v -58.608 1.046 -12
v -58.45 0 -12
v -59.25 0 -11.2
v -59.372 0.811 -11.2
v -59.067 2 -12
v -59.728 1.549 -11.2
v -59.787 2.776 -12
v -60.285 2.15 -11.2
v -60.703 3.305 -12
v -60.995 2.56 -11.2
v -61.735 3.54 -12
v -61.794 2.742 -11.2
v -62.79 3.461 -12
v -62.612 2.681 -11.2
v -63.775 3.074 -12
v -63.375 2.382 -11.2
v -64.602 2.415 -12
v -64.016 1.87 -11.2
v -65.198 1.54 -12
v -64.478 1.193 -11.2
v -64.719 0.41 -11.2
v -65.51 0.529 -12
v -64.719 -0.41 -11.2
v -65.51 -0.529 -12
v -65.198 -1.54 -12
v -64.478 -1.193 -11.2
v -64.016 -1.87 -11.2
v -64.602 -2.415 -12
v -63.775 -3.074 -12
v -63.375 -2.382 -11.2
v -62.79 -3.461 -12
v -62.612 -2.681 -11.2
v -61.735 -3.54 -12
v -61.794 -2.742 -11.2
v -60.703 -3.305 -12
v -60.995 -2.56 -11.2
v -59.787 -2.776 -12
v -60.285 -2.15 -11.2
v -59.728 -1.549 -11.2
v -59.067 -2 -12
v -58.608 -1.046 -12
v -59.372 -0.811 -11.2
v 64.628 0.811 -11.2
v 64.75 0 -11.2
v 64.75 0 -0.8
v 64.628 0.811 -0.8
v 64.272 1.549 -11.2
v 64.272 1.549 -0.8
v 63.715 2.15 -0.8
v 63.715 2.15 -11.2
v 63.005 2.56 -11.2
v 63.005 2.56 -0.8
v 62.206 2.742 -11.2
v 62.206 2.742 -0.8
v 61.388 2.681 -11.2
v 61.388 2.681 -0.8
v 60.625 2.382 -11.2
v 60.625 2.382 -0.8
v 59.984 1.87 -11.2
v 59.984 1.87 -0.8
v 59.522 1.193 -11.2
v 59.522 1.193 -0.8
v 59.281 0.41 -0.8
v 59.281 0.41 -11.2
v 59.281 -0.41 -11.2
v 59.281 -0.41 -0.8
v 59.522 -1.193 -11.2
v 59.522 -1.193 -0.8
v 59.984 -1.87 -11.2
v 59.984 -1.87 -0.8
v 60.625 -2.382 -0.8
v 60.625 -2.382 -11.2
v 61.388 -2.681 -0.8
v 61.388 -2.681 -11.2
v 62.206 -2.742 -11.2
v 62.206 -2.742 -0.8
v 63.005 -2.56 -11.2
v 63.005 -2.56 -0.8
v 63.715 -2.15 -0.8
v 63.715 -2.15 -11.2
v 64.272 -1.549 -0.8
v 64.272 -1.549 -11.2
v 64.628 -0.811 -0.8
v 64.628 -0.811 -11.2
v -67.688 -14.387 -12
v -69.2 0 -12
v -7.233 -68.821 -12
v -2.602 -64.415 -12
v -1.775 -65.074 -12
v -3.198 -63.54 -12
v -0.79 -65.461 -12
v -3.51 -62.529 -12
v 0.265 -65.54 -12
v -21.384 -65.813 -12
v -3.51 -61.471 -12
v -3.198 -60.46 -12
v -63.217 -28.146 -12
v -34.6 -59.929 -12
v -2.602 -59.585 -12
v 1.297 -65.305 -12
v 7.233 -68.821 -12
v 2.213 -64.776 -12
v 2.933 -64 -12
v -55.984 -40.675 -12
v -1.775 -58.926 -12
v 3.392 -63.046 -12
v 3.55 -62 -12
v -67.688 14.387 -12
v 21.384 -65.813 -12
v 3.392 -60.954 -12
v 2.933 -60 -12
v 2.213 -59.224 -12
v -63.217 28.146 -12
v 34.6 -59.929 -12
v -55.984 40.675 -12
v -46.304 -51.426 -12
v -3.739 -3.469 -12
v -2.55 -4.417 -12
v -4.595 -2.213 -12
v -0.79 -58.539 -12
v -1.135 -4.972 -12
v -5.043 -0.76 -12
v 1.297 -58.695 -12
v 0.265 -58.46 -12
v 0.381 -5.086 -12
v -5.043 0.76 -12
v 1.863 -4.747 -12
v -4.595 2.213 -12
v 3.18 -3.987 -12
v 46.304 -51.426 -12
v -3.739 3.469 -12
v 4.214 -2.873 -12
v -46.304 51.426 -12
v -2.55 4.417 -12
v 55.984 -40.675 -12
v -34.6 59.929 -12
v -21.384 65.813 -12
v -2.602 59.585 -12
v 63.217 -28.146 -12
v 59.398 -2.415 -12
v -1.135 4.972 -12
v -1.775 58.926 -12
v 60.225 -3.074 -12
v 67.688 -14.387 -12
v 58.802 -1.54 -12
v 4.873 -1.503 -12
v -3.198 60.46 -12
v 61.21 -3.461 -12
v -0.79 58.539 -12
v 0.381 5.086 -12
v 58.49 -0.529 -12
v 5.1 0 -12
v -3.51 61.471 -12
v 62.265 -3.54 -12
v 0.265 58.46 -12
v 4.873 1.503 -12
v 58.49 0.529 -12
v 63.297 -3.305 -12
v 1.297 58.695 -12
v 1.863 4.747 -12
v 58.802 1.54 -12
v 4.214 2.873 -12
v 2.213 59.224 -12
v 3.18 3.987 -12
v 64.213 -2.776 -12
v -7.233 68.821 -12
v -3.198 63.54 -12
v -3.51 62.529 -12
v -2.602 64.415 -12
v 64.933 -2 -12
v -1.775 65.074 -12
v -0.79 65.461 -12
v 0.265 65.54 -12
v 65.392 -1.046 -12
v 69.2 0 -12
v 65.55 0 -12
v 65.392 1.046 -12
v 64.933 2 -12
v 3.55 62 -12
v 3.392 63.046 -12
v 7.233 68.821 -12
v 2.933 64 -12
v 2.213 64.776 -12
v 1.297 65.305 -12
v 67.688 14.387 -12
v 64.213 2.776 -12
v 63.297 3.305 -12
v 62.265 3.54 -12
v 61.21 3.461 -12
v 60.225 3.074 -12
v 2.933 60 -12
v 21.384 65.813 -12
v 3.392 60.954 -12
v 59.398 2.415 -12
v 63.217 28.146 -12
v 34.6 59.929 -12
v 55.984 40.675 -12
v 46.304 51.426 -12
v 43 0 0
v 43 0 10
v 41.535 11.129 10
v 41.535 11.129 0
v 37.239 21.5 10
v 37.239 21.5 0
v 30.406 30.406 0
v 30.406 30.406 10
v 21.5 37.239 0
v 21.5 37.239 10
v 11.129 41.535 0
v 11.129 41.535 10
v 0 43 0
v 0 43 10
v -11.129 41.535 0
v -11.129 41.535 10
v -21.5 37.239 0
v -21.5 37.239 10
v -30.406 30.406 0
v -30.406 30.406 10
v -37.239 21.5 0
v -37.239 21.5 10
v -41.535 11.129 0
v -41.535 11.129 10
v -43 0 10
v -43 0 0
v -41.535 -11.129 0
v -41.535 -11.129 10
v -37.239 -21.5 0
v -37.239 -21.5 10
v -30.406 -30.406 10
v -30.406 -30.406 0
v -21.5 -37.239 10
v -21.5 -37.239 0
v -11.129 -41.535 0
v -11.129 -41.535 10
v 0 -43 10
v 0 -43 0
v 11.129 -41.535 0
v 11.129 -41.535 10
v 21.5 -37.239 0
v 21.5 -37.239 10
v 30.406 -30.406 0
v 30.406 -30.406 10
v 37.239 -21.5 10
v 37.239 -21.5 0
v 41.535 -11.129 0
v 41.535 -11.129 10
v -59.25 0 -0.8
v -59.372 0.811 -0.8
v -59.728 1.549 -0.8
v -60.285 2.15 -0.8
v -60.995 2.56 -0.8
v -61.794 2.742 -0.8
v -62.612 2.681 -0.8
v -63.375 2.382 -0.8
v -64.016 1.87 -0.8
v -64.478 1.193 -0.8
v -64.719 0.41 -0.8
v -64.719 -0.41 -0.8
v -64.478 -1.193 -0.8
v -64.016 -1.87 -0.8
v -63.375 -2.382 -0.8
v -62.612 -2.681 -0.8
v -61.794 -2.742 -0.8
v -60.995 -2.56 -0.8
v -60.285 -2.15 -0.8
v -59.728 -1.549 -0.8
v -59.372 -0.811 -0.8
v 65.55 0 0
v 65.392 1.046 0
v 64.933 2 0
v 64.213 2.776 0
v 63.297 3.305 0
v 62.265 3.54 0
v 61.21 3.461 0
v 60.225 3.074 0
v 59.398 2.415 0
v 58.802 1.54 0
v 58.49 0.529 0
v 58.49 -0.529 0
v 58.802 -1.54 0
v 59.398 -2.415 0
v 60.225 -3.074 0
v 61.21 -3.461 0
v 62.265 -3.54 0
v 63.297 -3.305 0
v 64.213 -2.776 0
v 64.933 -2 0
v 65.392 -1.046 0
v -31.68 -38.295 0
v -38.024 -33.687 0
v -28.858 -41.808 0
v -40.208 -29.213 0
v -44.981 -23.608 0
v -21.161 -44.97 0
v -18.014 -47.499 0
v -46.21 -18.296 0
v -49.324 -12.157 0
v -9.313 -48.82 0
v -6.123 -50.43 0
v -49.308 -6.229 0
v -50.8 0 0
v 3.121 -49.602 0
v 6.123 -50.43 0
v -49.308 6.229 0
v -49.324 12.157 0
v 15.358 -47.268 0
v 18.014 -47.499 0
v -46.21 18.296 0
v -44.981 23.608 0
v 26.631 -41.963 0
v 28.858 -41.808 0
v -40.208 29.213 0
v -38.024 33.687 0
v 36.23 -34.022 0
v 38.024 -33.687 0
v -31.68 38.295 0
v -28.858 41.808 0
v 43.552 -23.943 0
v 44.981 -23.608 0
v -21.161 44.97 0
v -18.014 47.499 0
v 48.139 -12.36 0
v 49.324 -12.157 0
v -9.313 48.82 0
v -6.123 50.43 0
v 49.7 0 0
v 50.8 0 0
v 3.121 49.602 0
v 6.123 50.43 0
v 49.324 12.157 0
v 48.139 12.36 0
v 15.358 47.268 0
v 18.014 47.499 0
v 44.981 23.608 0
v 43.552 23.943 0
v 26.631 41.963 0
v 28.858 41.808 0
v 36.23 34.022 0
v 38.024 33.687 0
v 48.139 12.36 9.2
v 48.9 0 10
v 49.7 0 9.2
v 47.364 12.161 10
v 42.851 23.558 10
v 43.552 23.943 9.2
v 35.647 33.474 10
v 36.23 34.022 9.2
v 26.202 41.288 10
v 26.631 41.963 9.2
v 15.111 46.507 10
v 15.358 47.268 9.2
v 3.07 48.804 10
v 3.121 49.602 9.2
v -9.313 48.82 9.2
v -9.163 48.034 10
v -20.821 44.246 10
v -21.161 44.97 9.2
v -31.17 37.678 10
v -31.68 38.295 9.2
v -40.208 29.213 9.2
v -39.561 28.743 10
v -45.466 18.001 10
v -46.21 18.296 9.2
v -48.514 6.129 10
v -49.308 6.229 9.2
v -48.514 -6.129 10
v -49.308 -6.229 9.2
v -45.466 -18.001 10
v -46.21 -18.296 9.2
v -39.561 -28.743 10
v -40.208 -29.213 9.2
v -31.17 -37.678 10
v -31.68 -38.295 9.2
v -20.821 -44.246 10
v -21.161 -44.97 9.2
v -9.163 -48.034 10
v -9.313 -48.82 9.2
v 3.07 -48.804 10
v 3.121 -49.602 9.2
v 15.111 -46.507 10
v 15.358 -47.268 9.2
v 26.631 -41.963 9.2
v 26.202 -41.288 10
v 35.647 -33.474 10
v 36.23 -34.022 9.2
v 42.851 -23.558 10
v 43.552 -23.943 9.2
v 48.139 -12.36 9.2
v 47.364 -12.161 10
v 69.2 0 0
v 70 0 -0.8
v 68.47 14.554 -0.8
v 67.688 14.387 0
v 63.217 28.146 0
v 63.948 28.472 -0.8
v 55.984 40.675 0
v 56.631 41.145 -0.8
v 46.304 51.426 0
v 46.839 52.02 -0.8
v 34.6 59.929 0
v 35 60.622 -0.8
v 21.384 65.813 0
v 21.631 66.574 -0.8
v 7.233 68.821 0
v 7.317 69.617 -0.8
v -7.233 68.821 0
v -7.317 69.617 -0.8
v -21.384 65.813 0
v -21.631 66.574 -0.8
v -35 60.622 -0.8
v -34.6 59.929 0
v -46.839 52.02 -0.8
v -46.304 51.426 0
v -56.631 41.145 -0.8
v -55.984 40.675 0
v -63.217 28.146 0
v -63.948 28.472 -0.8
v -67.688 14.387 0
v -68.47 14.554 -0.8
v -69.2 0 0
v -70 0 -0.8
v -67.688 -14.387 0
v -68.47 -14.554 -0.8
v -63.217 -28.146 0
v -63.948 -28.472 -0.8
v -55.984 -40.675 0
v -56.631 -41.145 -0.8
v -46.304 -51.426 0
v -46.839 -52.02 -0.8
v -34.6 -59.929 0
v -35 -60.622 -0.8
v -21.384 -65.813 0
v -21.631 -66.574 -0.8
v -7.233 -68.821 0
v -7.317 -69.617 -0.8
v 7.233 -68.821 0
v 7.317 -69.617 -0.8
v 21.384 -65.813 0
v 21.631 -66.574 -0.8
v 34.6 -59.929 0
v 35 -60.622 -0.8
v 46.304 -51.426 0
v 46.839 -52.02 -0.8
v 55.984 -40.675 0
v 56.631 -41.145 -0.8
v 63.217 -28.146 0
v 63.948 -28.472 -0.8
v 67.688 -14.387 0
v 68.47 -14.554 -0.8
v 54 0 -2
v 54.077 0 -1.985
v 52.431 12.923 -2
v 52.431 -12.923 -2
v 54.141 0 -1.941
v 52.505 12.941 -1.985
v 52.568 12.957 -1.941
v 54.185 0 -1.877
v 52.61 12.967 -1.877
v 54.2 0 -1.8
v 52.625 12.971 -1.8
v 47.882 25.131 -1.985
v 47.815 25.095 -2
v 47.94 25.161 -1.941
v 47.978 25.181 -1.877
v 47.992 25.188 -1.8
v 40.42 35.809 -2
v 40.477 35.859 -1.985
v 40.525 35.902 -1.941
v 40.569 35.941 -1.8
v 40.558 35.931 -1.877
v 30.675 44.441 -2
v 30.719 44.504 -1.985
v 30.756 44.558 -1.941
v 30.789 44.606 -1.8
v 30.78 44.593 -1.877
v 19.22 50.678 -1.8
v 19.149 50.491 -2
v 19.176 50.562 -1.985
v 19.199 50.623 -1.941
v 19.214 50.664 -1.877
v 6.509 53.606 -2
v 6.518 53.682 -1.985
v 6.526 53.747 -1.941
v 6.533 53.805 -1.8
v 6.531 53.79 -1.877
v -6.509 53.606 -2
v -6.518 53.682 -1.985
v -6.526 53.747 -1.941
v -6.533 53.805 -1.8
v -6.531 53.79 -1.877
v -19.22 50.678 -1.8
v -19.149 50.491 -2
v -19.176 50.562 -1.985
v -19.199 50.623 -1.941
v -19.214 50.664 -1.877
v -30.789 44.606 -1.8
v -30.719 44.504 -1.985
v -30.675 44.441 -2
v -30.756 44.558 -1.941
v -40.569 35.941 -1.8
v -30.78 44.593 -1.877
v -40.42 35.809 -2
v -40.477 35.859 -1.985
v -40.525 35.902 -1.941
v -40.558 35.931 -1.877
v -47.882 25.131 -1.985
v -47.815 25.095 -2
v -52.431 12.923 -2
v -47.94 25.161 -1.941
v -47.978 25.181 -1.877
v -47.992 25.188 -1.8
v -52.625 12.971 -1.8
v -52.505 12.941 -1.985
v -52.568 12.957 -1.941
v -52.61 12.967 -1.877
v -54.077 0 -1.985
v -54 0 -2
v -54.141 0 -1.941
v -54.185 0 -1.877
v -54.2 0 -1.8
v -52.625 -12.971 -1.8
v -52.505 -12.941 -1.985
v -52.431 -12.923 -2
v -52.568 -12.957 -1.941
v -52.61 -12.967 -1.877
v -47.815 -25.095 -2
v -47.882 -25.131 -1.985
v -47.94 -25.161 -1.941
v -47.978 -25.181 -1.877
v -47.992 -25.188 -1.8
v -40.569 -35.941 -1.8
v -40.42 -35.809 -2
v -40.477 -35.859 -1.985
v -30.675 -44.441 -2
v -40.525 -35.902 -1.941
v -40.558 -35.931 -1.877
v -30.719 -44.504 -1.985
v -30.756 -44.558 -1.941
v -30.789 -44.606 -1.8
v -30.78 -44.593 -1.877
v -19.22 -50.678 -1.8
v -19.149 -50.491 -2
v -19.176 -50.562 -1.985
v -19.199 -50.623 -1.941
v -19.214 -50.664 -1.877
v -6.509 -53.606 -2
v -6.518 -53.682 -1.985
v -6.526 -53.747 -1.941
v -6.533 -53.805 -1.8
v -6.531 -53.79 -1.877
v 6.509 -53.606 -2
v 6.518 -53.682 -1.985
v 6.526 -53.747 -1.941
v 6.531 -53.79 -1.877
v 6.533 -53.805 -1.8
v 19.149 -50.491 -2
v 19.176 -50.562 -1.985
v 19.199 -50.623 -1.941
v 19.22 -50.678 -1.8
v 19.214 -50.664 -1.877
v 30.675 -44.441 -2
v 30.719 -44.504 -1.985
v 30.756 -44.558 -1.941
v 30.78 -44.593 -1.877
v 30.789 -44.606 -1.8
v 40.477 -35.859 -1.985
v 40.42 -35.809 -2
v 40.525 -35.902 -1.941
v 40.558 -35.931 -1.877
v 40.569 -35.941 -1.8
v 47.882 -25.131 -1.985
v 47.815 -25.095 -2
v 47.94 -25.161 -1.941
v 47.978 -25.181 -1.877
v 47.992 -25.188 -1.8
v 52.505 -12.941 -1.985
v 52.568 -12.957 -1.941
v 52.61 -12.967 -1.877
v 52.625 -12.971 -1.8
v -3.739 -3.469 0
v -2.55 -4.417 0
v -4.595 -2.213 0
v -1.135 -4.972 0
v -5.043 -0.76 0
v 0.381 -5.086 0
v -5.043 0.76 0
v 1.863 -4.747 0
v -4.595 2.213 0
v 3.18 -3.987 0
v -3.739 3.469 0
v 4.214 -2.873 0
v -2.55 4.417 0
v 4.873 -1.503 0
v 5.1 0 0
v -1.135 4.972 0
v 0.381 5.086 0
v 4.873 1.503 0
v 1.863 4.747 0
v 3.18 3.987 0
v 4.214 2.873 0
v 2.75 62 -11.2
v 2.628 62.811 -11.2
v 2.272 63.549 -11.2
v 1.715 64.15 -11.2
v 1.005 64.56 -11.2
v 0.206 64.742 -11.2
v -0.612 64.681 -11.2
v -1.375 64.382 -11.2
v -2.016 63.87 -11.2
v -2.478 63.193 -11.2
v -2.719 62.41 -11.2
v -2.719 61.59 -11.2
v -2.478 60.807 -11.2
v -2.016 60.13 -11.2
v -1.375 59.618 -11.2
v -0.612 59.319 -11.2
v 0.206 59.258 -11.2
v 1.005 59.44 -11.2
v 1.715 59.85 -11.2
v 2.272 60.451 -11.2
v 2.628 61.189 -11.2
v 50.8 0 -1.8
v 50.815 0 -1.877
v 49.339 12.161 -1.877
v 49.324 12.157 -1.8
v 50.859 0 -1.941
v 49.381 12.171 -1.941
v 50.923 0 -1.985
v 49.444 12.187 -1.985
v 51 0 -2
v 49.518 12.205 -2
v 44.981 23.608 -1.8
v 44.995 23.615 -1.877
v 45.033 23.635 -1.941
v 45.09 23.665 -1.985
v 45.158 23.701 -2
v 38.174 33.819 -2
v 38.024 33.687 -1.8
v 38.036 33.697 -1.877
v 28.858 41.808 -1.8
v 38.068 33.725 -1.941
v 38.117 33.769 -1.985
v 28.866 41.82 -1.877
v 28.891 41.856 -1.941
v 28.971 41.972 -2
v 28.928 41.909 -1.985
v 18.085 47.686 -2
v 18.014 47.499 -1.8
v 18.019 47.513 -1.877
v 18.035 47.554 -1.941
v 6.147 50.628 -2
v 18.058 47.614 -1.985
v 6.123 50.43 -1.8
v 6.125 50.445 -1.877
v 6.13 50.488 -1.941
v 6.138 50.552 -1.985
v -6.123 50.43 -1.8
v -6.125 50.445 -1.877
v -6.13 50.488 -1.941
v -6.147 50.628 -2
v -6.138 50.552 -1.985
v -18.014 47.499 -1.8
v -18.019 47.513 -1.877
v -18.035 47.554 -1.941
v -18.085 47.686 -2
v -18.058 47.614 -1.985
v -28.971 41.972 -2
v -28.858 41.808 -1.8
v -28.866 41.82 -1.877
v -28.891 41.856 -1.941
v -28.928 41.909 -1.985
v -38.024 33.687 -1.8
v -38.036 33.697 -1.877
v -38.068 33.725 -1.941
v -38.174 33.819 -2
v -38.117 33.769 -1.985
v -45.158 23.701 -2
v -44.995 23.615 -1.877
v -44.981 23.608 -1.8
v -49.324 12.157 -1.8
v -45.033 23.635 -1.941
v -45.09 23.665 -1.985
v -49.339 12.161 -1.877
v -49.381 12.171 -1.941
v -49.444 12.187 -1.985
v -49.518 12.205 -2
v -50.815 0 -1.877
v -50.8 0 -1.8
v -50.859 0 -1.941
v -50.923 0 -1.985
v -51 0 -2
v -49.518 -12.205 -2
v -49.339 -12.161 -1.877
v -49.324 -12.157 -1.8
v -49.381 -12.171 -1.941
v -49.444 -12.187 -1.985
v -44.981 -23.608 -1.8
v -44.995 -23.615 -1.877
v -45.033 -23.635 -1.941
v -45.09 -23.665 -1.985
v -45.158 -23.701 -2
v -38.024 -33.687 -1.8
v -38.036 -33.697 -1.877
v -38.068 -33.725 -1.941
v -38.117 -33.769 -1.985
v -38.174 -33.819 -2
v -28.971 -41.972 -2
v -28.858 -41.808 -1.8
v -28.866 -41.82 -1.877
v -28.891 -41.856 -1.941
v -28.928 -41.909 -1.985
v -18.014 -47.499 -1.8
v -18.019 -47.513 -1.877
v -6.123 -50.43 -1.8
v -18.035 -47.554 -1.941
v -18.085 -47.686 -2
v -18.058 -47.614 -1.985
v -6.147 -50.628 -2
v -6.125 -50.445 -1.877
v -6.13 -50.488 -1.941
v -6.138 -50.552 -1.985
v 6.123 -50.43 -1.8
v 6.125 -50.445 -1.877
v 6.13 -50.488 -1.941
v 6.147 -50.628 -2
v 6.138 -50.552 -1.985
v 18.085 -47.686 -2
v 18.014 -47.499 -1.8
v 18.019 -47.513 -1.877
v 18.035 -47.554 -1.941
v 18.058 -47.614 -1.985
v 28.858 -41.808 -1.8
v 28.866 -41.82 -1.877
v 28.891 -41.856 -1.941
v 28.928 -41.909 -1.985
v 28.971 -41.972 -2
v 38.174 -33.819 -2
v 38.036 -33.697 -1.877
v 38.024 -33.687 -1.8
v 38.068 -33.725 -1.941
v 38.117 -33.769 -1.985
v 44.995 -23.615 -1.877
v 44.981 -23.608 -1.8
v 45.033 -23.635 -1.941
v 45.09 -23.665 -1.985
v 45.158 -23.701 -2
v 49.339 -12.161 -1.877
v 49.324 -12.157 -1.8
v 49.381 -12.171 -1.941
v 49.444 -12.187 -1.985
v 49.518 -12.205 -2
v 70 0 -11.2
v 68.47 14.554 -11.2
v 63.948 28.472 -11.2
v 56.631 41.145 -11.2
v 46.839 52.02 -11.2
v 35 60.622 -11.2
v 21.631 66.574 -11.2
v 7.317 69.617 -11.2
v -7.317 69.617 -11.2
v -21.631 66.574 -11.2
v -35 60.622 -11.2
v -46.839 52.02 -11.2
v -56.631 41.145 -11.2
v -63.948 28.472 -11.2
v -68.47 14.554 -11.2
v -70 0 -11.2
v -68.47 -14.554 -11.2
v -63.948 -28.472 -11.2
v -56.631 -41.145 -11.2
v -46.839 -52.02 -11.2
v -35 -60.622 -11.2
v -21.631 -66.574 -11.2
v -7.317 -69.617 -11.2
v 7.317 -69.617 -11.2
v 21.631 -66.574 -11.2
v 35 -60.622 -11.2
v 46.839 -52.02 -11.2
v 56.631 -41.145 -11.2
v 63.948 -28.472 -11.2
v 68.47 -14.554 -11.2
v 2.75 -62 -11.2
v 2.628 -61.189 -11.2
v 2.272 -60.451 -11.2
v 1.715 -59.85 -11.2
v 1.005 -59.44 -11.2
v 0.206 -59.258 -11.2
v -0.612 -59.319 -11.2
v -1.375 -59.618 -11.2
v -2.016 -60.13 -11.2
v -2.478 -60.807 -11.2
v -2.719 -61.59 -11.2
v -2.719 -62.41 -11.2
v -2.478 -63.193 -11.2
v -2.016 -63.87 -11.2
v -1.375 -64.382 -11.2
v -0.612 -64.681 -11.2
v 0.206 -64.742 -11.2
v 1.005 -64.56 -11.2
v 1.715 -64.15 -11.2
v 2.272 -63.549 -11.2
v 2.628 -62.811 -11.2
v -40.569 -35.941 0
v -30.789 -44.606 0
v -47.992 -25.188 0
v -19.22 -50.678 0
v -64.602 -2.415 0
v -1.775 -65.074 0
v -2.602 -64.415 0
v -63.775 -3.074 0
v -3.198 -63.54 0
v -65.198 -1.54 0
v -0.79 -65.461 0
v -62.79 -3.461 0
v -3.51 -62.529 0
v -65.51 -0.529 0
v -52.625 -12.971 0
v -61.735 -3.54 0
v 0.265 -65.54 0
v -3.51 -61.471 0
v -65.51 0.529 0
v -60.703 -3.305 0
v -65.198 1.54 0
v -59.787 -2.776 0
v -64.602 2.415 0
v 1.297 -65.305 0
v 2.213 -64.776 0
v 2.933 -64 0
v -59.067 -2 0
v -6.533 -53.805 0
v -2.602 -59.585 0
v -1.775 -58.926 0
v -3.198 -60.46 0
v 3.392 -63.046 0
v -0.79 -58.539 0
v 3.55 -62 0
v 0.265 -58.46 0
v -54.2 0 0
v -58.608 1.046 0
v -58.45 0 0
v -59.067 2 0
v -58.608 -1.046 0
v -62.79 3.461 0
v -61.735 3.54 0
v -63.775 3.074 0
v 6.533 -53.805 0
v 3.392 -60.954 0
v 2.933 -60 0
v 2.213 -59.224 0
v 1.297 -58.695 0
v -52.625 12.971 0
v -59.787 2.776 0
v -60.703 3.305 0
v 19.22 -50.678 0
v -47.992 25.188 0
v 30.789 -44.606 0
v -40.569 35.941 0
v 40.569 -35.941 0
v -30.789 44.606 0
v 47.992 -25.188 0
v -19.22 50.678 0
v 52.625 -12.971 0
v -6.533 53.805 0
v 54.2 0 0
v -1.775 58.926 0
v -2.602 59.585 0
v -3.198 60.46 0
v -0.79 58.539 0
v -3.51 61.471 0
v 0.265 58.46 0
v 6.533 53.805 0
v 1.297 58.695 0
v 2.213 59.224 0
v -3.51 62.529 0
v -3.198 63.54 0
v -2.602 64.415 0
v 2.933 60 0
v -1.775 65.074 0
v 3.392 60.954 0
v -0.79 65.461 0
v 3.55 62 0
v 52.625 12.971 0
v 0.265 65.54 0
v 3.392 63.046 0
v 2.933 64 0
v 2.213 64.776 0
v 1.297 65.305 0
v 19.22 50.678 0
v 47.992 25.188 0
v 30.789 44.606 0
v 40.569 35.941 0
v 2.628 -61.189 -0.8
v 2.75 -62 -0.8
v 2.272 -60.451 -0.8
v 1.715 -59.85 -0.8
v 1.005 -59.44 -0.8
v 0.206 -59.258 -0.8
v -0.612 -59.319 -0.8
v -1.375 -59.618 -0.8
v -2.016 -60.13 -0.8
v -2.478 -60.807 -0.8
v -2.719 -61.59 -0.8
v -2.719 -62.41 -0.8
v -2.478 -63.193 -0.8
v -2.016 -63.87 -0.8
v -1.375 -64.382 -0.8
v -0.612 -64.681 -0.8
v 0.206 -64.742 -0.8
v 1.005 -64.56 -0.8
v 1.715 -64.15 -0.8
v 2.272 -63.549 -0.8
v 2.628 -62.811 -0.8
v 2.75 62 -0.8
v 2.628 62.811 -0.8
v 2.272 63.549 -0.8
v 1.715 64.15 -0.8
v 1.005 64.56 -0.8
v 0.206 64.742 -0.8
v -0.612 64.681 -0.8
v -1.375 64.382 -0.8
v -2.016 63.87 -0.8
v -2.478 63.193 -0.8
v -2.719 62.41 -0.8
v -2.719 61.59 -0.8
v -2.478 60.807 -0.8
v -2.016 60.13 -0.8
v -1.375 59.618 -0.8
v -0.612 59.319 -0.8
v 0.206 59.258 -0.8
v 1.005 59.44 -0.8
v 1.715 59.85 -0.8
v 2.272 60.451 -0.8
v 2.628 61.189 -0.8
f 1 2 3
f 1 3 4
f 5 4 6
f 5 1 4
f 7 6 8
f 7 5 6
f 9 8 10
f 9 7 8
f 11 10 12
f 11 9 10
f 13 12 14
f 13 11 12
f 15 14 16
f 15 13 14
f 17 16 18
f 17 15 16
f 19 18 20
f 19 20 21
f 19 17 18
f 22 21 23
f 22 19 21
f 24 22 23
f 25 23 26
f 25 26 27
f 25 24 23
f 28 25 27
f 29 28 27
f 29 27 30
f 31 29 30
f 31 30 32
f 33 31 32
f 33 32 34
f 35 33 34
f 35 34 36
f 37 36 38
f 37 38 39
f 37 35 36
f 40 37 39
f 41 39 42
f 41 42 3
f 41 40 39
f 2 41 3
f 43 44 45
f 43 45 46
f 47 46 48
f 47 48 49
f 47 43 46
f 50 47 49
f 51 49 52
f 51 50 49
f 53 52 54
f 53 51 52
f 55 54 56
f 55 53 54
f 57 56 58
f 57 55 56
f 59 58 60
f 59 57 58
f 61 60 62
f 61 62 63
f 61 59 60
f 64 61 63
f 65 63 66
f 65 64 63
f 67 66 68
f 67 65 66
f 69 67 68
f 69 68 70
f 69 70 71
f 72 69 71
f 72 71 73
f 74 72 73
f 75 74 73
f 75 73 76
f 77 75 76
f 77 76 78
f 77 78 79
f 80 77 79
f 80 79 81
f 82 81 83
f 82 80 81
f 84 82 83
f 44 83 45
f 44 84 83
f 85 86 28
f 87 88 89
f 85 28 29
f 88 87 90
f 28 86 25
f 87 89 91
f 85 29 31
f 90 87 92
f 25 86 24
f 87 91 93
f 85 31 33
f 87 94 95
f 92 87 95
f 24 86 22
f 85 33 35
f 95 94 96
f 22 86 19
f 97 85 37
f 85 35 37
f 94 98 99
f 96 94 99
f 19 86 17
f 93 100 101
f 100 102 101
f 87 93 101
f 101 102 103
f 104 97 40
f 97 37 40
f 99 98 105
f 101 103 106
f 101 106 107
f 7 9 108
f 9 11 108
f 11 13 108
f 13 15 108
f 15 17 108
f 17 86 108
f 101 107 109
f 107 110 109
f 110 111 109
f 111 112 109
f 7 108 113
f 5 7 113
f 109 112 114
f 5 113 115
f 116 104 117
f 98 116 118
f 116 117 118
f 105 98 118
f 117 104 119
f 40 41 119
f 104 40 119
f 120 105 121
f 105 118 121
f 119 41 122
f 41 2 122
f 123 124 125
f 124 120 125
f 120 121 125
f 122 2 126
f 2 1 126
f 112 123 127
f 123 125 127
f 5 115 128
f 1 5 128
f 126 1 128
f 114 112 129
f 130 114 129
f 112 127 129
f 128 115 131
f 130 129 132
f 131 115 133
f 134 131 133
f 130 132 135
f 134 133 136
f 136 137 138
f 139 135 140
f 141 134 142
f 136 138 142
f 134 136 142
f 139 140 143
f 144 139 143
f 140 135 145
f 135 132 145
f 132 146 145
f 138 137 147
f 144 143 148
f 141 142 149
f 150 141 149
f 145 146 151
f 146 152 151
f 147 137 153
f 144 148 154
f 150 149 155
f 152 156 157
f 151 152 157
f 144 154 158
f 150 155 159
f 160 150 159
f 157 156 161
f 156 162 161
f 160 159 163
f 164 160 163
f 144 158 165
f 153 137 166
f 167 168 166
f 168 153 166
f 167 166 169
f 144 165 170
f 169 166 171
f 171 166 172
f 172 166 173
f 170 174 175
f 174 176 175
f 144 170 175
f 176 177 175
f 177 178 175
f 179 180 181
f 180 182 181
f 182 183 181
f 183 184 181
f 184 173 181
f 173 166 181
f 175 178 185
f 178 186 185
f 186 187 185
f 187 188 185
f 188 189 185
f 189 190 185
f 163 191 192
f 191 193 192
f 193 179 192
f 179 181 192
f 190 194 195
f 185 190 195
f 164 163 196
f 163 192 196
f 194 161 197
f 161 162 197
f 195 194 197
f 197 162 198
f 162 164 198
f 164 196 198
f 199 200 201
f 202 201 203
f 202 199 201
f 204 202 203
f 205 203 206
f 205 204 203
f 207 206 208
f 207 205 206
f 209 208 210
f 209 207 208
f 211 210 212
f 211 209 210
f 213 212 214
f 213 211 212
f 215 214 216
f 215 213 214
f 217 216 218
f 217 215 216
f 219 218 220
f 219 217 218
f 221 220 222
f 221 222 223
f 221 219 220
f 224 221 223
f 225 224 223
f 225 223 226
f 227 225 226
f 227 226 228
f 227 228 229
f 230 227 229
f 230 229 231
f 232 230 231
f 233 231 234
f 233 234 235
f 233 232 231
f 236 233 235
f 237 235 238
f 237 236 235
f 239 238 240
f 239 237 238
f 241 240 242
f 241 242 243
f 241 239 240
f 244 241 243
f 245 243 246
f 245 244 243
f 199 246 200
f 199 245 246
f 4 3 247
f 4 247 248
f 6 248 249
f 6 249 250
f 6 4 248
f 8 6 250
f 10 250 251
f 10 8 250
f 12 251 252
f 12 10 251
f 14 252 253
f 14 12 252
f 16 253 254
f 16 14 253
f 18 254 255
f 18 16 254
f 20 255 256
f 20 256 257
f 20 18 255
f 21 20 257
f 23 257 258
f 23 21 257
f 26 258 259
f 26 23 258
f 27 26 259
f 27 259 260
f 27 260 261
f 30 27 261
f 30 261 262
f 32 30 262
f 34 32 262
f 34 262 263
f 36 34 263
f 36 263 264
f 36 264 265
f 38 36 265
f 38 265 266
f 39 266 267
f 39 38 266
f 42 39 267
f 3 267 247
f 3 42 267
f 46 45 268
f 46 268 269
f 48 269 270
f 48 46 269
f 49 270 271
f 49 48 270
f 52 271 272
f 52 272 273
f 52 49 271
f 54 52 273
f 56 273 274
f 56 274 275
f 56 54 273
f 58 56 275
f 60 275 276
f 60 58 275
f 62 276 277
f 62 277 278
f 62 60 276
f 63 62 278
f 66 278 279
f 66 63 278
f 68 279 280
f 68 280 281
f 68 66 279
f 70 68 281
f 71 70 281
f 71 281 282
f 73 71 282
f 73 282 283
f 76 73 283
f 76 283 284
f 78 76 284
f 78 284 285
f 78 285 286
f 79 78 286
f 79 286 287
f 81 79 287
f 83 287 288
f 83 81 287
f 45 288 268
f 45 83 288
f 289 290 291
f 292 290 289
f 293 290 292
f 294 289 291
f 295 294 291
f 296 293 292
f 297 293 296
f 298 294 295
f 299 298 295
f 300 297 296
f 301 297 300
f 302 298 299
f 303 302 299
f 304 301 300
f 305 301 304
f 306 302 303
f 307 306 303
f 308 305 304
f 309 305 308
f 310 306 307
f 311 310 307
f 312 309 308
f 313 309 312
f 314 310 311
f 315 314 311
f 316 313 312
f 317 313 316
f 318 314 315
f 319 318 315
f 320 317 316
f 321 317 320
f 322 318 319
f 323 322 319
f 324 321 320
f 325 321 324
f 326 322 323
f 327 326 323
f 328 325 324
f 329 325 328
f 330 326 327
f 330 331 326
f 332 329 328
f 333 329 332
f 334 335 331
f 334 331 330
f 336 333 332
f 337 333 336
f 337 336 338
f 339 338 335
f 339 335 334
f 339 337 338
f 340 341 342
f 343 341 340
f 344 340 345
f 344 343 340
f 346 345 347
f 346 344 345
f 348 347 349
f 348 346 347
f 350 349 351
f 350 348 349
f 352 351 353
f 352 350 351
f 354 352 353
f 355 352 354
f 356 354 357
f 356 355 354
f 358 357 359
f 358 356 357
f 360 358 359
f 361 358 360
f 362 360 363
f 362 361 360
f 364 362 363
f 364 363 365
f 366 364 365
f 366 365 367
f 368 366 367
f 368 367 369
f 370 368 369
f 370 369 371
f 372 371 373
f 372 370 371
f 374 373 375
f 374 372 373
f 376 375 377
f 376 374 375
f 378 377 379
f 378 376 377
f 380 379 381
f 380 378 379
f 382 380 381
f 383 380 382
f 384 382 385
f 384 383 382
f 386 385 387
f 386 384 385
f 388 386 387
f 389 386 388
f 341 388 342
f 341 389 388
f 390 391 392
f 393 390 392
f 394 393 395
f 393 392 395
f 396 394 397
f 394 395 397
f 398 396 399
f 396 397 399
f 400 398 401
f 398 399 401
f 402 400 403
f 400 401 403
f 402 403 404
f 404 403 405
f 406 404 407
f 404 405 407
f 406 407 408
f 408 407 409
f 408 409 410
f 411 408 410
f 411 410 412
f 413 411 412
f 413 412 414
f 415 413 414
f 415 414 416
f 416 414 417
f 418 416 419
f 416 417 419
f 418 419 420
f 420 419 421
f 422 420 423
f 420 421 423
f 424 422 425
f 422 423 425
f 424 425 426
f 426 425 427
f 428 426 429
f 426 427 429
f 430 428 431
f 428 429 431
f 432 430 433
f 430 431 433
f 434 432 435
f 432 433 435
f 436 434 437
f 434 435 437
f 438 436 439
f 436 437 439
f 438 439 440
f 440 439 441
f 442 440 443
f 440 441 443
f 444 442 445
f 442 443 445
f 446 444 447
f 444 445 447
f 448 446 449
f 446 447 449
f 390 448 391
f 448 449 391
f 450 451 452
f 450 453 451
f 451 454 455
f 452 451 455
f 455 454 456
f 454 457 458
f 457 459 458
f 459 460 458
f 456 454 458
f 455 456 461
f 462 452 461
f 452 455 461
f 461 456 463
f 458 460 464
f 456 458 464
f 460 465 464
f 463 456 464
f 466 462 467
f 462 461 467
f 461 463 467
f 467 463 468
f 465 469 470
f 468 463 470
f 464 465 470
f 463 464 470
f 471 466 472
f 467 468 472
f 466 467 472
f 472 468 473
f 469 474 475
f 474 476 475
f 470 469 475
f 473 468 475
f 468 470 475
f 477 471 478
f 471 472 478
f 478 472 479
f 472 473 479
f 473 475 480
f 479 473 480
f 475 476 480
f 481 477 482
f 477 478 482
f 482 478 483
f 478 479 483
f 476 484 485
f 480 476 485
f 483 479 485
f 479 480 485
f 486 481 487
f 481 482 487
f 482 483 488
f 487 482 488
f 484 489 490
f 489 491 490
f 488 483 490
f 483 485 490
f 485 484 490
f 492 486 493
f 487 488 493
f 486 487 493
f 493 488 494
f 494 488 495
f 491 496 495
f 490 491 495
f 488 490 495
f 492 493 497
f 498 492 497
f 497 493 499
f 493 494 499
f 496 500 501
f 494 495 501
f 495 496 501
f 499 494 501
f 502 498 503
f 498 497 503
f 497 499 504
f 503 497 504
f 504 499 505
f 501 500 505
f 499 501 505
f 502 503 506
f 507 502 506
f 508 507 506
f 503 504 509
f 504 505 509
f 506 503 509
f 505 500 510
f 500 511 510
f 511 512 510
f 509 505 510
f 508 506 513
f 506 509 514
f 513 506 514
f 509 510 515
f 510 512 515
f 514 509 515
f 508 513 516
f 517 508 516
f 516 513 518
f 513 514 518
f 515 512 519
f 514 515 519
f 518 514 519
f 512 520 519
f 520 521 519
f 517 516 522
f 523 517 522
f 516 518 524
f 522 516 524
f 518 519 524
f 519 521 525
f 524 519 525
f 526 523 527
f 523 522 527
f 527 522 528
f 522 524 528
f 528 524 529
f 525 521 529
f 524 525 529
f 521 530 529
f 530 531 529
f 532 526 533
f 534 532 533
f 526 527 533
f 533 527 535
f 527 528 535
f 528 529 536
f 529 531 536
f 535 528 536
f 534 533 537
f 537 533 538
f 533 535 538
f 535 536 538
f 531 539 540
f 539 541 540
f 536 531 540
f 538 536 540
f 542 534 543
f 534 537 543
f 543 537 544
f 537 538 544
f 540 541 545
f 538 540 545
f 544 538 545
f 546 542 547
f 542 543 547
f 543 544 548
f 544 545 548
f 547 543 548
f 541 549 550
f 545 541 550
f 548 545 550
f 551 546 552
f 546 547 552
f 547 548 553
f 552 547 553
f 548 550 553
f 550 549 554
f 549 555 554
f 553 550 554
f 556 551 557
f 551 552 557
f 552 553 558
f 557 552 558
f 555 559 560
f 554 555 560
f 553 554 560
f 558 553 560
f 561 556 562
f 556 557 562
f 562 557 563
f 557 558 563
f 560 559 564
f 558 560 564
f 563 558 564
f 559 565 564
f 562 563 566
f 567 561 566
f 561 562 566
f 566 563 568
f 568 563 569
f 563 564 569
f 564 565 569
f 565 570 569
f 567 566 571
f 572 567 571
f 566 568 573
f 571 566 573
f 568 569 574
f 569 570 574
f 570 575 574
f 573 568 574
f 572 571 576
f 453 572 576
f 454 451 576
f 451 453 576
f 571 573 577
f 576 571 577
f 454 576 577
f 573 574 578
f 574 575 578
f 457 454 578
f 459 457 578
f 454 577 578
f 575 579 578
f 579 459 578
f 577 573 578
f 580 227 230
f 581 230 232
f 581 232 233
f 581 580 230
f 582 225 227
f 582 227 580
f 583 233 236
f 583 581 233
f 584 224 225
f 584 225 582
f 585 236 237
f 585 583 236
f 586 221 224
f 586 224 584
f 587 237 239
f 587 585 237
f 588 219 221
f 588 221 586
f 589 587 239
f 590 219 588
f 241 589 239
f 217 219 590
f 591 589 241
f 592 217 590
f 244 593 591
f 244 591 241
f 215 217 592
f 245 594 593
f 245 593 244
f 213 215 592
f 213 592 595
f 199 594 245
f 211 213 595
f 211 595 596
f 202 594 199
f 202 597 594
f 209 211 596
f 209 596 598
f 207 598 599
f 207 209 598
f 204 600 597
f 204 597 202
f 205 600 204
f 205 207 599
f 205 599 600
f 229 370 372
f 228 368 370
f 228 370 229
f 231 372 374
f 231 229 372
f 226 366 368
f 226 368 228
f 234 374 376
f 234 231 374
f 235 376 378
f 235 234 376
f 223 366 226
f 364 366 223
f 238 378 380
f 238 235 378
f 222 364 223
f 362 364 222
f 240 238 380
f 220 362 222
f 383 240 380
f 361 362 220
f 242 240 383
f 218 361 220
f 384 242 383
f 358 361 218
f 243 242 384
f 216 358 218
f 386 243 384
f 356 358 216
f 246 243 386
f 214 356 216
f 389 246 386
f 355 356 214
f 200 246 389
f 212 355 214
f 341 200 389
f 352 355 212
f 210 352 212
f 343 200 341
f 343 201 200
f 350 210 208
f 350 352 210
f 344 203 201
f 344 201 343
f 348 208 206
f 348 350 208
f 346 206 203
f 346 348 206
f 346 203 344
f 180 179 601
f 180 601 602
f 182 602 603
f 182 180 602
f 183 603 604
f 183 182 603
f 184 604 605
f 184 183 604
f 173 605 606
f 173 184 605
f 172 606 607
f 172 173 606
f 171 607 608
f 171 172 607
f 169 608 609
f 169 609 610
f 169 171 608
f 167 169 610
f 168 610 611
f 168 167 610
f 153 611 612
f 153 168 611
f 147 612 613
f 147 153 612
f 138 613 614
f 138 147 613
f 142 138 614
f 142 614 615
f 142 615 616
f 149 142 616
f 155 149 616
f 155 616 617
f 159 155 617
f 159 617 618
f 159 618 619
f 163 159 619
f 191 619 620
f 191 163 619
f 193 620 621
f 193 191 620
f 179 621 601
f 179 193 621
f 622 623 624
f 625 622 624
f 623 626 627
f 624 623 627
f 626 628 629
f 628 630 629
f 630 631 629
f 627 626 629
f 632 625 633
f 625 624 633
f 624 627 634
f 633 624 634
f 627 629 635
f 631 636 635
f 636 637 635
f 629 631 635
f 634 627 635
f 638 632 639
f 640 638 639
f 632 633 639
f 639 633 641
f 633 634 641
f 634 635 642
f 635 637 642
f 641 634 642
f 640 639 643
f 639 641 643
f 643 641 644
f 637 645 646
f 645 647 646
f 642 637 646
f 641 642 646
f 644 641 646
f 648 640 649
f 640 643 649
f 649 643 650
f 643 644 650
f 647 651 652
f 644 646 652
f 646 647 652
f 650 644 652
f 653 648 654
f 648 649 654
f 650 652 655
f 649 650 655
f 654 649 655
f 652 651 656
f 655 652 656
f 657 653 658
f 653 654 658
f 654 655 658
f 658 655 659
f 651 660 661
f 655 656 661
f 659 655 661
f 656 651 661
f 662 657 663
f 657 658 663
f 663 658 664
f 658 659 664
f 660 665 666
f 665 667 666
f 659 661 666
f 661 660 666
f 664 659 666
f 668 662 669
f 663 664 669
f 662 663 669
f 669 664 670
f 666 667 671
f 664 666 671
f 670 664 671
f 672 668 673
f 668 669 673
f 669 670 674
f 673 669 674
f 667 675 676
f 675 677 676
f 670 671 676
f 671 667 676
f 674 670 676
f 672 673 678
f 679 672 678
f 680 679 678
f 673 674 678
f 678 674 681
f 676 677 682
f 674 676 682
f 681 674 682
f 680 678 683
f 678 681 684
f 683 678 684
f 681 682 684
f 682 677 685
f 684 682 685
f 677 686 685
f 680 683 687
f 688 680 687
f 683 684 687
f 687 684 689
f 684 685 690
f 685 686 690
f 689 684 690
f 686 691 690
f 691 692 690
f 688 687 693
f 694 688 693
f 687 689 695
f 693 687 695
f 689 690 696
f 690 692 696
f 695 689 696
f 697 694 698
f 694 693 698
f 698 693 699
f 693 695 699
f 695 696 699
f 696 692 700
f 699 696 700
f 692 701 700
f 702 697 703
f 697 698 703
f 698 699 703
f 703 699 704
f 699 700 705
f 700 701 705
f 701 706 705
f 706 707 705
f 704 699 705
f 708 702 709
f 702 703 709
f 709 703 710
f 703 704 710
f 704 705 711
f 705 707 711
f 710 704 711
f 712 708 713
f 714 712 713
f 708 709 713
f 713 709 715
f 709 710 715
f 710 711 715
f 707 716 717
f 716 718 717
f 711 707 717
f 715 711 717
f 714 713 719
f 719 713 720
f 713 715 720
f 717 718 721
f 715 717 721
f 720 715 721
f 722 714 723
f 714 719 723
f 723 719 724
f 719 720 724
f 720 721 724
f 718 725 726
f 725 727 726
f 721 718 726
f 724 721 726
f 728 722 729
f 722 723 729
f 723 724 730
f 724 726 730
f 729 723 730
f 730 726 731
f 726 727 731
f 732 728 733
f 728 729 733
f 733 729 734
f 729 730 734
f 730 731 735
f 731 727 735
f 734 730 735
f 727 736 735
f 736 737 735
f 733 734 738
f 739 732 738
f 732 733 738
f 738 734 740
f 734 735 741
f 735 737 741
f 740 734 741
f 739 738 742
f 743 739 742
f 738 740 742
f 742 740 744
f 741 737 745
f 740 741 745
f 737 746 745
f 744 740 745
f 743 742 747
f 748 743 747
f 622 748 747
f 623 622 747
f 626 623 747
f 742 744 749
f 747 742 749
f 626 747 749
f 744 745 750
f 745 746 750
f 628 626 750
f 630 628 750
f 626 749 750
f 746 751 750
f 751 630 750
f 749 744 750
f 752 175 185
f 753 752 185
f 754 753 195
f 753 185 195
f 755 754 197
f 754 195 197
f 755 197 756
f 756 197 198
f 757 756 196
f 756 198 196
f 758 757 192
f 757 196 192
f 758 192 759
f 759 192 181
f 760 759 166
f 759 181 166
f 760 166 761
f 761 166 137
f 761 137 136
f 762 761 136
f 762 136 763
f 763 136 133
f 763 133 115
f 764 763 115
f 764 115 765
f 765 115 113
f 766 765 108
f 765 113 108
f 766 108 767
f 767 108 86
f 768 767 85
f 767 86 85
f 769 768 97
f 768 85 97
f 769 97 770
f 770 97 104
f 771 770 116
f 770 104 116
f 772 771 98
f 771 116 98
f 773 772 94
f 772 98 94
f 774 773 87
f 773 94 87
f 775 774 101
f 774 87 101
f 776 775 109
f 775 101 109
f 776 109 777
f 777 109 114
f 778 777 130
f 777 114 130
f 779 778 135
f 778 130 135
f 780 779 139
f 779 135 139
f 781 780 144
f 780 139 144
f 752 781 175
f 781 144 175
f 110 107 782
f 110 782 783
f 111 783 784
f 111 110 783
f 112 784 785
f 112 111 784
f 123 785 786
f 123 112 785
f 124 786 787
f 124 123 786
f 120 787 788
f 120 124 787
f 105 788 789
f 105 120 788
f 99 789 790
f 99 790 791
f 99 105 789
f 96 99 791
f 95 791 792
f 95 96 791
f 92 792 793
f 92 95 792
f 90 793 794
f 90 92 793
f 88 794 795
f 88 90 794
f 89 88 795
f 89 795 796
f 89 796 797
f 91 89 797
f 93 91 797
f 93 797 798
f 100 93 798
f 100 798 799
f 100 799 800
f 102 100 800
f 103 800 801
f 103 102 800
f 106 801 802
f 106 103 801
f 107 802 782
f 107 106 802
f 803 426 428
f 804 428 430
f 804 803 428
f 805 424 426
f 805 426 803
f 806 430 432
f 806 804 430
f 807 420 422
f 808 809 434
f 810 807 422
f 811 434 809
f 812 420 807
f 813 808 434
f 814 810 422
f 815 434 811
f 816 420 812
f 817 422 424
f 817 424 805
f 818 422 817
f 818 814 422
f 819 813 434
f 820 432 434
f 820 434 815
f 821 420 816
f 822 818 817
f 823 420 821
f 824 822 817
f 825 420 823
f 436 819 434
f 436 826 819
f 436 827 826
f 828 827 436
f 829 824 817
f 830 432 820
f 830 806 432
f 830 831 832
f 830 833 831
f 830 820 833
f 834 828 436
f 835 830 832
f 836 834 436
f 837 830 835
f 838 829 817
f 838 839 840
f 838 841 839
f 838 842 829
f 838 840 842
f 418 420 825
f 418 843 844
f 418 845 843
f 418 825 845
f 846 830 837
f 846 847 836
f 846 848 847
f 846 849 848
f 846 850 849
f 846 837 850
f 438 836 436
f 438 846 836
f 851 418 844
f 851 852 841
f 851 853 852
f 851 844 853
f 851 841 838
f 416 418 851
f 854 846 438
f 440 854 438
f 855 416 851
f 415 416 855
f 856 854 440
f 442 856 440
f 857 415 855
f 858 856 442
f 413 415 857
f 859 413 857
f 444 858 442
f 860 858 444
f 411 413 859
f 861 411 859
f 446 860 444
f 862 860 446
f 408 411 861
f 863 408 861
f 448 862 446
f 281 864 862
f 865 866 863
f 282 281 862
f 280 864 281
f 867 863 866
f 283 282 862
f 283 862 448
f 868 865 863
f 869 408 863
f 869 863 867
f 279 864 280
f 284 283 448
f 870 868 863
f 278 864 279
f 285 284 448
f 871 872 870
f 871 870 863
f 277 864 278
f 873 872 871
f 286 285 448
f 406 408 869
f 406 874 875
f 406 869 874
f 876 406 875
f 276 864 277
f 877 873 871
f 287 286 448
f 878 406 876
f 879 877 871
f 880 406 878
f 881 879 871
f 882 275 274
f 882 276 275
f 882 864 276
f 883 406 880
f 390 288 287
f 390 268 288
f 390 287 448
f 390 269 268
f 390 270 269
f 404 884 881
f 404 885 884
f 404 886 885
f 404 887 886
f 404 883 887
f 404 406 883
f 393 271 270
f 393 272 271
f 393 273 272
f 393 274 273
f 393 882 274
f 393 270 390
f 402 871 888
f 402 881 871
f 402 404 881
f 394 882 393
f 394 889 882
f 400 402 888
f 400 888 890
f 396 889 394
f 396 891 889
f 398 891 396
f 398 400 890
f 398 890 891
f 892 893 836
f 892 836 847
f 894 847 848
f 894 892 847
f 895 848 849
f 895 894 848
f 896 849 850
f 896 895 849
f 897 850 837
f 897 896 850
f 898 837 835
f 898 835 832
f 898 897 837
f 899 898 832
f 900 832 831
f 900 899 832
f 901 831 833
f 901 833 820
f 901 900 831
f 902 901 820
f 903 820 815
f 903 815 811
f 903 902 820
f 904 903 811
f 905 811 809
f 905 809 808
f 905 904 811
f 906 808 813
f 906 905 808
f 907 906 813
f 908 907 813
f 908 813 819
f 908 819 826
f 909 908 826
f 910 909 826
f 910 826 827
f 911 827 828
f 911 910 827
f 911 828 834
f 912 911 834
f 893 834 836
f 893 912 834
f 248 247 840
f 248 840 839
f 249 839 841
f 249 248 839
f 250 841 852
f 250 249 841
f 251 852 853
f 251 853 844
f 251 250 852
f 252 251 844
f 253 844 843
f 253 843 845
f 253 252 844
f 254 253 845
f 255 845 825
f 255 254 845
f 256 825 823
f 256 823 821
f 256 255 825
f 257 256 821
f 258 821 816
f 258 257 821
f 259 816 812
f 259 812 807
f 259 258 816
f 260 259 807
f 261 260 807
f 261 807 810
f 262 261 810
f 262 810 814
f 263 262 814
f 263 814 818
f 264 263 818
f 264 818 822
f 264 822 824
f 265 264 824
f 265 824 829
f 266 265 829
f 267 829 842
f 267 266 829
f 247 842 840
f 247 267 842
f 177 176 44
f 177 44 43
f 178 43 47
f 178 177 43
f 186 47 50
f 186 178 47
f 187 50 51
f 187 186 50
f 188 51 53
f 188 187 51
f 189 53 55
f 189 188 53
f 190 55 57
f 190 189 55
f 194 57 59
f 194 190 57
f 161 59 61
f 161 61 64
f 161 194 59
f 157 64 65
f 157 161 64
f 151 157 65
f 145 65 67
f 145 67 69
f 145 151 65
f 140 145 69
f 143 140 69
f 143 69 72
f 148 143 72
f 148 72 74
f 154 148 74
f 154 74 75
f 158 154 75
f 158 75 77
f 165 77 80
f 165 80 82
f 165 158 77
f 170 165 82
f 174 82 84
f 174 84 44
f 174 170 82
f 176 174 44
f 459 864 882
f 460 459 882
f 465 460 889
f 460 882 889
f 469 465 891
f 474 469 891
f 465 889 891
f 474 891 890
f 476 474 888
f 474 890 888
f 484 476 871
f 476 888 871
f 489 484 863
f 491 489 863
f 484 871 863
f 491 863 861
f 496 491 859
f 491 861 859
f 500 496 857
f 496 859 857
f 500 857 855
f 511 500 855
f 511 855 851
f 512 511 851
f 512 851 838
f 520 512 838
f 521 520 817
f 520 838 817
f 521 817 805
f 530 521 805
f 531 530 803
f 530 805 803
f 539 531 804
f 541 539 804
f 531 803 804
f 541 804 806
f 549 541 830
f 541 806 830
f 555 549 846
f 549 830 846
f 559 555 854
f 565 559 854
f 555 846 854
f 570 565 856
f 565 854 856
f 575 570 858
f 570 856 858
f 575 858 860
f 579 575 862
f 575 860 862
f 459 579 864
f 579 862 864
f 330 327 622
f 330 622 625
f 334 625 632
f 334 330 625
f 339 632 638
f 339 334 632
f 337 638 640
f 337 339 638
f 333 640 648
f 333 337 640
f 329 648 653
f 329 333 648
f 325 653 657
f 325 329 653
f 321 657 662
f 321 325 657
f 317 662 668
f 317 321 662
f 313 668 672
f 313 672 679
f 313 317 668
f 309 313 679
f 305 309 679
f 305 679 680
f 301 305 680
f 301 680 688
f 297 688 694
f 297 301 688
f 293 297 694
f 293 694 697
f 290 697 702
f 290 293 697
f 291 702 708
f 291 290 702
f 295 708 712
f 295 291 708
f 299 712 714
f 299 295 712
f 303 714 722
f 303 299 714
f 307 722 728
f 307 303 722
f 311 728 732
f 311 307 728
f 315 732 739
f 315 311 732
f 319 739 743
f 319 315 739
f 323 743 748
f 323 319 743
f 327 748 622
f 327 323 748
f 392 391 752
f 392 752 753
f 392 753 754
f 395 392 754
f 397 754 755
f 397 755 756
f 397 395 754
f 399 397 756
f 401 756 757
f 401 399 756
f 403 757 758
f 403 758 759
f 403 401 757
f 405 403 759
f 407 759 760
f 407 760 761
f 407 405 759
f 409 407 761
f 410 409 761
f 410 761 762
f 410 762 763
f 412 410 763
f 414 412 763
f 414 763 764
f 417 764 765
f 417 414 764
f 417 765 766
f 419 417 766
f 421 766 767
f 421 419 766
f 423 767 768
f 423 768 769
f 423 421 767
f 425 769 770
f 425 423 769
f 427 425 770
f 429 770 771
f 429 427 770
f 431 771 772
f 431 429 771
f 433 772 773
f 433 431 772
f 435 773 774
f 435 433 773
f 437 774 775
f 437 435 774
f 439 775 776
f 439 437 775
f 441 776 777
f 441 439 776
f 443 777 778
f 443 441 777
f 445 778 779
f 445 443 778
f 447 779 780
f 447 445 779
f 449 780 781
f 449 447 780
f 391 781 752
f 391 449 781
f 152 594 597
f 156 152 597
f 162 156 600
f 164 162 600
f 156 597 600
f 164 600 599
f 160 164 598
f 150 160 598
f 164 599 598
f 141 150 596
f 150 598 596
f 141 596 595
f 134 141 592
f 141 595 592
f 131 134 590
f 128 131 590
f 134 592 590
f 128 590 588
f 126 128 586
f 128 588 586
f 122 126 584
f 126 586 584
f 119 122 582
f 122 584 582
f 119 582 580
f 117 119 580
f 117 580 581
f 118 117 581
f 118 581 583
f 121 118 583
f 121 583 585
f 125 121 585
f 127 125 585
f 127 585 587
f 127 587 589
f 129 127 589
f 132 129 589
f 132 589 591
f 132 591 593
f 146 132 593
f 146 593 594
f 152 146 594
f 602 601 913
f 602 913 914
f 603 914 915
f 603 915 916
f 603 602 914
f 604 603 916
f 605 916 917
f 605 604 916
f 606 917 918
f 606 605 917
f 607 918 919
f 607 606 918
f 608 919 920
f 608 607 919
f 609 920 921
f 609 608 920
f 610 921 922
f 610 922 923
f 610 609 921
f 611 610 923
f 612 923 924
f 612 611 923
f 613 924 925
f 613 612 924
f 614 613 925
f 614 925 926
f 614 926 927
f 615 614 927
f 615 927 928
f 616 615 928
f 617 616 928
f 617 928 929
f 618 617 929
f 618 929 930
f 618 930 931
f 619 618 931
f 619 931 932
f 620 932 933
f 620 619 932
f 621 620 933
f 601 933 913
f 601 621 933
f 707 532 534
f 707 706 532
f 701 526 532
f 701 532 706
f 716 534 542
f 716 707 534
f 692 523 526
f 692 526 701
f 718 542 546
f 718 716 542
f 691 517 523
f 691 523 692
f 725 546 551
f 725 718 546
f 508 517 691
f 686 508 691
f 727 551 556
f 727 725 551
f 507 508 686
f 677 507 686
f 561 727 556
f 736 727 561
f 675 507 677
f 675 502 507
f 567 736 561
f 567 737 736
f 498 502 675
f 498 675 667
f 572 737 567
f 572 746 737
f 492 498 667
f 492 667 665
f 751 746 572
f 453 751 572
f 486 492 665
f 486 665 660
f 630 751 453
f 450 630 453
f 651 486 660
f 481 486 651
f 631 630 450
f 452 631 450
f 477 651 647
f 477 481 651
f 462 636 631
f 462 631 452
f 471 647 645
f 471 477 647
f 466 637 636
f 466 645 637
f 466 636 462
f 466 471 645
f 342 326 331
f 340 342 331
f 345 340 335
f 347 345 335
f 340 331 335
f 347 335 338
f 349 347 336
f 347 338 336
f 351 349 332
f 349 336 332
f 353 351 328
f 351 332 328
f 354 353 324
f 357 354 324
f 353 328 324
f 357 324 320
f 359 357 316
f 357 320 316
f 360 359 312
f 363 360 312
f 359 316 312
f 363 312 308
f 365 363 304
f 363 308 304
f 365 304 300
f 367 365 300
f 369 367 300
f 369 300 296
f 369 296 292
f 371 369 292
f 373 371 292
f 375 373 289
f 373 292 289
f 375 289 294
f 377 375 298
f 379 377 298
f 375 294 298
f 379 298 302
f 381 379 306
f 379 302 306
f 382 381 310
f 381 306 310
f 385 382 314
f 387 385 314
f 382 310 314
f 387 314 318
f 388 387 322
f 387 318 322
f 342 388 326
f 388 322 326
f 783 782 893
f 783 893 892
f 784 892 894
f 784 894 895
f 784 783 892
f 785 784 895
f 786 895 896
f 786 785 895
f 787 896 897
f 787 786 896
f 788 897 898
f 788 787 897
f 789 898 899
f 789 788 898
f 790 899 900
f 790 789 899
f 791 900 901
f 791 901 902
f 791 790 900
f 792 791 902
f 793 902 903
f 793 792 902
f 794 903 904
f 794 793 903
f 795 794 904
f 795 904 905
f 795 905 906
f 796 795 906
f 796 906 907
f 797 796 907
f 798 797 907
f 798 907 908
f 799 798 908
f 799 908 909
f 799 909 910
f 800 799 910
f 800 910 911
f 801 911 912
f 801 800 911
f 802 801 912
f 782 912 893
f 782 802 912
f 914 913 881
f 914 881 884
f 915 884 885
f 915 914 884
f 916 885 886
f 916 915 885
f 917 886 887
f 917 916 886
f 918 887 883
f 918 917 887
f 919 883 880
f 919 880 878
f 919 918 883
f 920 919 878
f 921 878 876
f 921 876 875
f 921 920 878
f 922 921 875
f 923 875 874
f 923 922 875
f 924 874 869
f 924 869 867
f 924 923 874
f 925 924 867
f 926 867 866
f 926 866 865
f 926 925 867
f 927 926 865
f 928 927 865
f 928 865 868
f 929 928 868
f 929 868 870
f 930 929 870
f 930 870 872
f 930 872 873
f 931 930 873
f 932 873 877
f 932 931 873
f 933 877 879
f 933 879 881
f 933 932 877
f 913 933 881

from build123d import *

# Parameters (mm, degrees)
SKETCH1_R           = 70
PLATE_DEPTH         = 12
SKETCH3_R           = 49.7
SKETCH3_R_2         = 43
SPIGOT_RING_DEPTH   = 10
CHAMFER_2_SIZE      = 0.8
SKETCH4_R           = 54.2
SKETCH4_R_2         = 50.8
FACE_GROOVE_DEPTH   = 2
FILLET1_R           = 0.2
ROD_HOLES_START     = -12
ROD_HOLES_OUTLINE_R = 2.75
ROD_HOLES_DEPTH     = 12
CHAMFER2_SIZE       = 0.8
P_C_D               = 10.2


# Read off the part's stored shape, not the designer's step: Rod_holes
with BuildPart() as part:
    # Sketch1 → PLATE (new body)
    with BuildSketch(Plane.XY):
        Circle(SKETCH1_R)
    extrude(amount=-PLATE_DEPTH)

    # Sketch3 → Spigot_Ring (add)
    with BuildSketch(Plane.XY):
        Circle(SKETCH3_R)
        Circle(SKETCH3_R_2, mode=Mode.SUBTRACT)
    extrude(amount=SPIGOT_RING_DEPTH)

    # Chamfer 2
    chamfer_2_edges = [part.edges().sort_by_distance(p)[0] for p in [
        (-49.7, 0, 10),
    ]]
    chamfer(chamfer_2_edges, length=CHAMFER_2_SIZE)

    # Sketch4 → Face_Groove (cut)
    with BuildSketch(Plane.XY):
        Circle(SKETCH4_R)
        Circle(SKETCH4_R_2, mode=Mode.SUBTRACT)
    extrude(amount=-FACE_GROOVE_DEPTH, mode=Mode.SUBTRACT)

    # Fillet1
    fillet1_edges = [part.edges().sort_by_distance(p)[0] for p in [
        (-54.2, 0, -2),
        (-50.8, 0, -2),
    ]]
    fillet(fillet1_edges, radius=FILLET1_R)

    # Rod_holes outline → Rod_holes (cut)
    with BuildSketch(Plane.XY.offset(ROD_HOLES_START)):
        with Locations((-62, 0)):
            Circle(ROD_HOLES_OUTLINE_R)
        with Locations((0, -62)):
            Circle(ROD_HOLES_OUTLINE_R)
        with Locations((62, 0)):
            Circle(ROD_HOLES_OUTLINE_R)
        with Locations((0, 62)):
            Circle(ROD_HOLES_OUTLINE_R)
    extrude(amount=ROD_HOLES_DEPTH, mode=Mode.SUBTRACT)

    # Chamfer2
    chamfer2_edges = [part.edges().sort_by_distance(p)[0] for p in [
        (-70, 0, 0),
        (-64.75, 0, 0),
        (-64.75, 0, -12),
        (-2.75, -62, 0),
        (-2.75, -62, -12),
        (59.25, 0, 0),
        (59.25, 0, -12),
        (-70, 0, -12),
        (-2.75, 62, 0),
        (-2.75, 62, -12),
    ]]
    chamfer(chamfer2_edges, length=CHAMFER2_SIZE)

    # P_C (through all)
    with Locations(Plane(origin=(0, 0, -12), x_dir=(-1, 0, 0), z_dir=(0, 0, -1))):
        with Locations((0, 0)):
            Hole(P_C_D / 2)


solid = part.part
